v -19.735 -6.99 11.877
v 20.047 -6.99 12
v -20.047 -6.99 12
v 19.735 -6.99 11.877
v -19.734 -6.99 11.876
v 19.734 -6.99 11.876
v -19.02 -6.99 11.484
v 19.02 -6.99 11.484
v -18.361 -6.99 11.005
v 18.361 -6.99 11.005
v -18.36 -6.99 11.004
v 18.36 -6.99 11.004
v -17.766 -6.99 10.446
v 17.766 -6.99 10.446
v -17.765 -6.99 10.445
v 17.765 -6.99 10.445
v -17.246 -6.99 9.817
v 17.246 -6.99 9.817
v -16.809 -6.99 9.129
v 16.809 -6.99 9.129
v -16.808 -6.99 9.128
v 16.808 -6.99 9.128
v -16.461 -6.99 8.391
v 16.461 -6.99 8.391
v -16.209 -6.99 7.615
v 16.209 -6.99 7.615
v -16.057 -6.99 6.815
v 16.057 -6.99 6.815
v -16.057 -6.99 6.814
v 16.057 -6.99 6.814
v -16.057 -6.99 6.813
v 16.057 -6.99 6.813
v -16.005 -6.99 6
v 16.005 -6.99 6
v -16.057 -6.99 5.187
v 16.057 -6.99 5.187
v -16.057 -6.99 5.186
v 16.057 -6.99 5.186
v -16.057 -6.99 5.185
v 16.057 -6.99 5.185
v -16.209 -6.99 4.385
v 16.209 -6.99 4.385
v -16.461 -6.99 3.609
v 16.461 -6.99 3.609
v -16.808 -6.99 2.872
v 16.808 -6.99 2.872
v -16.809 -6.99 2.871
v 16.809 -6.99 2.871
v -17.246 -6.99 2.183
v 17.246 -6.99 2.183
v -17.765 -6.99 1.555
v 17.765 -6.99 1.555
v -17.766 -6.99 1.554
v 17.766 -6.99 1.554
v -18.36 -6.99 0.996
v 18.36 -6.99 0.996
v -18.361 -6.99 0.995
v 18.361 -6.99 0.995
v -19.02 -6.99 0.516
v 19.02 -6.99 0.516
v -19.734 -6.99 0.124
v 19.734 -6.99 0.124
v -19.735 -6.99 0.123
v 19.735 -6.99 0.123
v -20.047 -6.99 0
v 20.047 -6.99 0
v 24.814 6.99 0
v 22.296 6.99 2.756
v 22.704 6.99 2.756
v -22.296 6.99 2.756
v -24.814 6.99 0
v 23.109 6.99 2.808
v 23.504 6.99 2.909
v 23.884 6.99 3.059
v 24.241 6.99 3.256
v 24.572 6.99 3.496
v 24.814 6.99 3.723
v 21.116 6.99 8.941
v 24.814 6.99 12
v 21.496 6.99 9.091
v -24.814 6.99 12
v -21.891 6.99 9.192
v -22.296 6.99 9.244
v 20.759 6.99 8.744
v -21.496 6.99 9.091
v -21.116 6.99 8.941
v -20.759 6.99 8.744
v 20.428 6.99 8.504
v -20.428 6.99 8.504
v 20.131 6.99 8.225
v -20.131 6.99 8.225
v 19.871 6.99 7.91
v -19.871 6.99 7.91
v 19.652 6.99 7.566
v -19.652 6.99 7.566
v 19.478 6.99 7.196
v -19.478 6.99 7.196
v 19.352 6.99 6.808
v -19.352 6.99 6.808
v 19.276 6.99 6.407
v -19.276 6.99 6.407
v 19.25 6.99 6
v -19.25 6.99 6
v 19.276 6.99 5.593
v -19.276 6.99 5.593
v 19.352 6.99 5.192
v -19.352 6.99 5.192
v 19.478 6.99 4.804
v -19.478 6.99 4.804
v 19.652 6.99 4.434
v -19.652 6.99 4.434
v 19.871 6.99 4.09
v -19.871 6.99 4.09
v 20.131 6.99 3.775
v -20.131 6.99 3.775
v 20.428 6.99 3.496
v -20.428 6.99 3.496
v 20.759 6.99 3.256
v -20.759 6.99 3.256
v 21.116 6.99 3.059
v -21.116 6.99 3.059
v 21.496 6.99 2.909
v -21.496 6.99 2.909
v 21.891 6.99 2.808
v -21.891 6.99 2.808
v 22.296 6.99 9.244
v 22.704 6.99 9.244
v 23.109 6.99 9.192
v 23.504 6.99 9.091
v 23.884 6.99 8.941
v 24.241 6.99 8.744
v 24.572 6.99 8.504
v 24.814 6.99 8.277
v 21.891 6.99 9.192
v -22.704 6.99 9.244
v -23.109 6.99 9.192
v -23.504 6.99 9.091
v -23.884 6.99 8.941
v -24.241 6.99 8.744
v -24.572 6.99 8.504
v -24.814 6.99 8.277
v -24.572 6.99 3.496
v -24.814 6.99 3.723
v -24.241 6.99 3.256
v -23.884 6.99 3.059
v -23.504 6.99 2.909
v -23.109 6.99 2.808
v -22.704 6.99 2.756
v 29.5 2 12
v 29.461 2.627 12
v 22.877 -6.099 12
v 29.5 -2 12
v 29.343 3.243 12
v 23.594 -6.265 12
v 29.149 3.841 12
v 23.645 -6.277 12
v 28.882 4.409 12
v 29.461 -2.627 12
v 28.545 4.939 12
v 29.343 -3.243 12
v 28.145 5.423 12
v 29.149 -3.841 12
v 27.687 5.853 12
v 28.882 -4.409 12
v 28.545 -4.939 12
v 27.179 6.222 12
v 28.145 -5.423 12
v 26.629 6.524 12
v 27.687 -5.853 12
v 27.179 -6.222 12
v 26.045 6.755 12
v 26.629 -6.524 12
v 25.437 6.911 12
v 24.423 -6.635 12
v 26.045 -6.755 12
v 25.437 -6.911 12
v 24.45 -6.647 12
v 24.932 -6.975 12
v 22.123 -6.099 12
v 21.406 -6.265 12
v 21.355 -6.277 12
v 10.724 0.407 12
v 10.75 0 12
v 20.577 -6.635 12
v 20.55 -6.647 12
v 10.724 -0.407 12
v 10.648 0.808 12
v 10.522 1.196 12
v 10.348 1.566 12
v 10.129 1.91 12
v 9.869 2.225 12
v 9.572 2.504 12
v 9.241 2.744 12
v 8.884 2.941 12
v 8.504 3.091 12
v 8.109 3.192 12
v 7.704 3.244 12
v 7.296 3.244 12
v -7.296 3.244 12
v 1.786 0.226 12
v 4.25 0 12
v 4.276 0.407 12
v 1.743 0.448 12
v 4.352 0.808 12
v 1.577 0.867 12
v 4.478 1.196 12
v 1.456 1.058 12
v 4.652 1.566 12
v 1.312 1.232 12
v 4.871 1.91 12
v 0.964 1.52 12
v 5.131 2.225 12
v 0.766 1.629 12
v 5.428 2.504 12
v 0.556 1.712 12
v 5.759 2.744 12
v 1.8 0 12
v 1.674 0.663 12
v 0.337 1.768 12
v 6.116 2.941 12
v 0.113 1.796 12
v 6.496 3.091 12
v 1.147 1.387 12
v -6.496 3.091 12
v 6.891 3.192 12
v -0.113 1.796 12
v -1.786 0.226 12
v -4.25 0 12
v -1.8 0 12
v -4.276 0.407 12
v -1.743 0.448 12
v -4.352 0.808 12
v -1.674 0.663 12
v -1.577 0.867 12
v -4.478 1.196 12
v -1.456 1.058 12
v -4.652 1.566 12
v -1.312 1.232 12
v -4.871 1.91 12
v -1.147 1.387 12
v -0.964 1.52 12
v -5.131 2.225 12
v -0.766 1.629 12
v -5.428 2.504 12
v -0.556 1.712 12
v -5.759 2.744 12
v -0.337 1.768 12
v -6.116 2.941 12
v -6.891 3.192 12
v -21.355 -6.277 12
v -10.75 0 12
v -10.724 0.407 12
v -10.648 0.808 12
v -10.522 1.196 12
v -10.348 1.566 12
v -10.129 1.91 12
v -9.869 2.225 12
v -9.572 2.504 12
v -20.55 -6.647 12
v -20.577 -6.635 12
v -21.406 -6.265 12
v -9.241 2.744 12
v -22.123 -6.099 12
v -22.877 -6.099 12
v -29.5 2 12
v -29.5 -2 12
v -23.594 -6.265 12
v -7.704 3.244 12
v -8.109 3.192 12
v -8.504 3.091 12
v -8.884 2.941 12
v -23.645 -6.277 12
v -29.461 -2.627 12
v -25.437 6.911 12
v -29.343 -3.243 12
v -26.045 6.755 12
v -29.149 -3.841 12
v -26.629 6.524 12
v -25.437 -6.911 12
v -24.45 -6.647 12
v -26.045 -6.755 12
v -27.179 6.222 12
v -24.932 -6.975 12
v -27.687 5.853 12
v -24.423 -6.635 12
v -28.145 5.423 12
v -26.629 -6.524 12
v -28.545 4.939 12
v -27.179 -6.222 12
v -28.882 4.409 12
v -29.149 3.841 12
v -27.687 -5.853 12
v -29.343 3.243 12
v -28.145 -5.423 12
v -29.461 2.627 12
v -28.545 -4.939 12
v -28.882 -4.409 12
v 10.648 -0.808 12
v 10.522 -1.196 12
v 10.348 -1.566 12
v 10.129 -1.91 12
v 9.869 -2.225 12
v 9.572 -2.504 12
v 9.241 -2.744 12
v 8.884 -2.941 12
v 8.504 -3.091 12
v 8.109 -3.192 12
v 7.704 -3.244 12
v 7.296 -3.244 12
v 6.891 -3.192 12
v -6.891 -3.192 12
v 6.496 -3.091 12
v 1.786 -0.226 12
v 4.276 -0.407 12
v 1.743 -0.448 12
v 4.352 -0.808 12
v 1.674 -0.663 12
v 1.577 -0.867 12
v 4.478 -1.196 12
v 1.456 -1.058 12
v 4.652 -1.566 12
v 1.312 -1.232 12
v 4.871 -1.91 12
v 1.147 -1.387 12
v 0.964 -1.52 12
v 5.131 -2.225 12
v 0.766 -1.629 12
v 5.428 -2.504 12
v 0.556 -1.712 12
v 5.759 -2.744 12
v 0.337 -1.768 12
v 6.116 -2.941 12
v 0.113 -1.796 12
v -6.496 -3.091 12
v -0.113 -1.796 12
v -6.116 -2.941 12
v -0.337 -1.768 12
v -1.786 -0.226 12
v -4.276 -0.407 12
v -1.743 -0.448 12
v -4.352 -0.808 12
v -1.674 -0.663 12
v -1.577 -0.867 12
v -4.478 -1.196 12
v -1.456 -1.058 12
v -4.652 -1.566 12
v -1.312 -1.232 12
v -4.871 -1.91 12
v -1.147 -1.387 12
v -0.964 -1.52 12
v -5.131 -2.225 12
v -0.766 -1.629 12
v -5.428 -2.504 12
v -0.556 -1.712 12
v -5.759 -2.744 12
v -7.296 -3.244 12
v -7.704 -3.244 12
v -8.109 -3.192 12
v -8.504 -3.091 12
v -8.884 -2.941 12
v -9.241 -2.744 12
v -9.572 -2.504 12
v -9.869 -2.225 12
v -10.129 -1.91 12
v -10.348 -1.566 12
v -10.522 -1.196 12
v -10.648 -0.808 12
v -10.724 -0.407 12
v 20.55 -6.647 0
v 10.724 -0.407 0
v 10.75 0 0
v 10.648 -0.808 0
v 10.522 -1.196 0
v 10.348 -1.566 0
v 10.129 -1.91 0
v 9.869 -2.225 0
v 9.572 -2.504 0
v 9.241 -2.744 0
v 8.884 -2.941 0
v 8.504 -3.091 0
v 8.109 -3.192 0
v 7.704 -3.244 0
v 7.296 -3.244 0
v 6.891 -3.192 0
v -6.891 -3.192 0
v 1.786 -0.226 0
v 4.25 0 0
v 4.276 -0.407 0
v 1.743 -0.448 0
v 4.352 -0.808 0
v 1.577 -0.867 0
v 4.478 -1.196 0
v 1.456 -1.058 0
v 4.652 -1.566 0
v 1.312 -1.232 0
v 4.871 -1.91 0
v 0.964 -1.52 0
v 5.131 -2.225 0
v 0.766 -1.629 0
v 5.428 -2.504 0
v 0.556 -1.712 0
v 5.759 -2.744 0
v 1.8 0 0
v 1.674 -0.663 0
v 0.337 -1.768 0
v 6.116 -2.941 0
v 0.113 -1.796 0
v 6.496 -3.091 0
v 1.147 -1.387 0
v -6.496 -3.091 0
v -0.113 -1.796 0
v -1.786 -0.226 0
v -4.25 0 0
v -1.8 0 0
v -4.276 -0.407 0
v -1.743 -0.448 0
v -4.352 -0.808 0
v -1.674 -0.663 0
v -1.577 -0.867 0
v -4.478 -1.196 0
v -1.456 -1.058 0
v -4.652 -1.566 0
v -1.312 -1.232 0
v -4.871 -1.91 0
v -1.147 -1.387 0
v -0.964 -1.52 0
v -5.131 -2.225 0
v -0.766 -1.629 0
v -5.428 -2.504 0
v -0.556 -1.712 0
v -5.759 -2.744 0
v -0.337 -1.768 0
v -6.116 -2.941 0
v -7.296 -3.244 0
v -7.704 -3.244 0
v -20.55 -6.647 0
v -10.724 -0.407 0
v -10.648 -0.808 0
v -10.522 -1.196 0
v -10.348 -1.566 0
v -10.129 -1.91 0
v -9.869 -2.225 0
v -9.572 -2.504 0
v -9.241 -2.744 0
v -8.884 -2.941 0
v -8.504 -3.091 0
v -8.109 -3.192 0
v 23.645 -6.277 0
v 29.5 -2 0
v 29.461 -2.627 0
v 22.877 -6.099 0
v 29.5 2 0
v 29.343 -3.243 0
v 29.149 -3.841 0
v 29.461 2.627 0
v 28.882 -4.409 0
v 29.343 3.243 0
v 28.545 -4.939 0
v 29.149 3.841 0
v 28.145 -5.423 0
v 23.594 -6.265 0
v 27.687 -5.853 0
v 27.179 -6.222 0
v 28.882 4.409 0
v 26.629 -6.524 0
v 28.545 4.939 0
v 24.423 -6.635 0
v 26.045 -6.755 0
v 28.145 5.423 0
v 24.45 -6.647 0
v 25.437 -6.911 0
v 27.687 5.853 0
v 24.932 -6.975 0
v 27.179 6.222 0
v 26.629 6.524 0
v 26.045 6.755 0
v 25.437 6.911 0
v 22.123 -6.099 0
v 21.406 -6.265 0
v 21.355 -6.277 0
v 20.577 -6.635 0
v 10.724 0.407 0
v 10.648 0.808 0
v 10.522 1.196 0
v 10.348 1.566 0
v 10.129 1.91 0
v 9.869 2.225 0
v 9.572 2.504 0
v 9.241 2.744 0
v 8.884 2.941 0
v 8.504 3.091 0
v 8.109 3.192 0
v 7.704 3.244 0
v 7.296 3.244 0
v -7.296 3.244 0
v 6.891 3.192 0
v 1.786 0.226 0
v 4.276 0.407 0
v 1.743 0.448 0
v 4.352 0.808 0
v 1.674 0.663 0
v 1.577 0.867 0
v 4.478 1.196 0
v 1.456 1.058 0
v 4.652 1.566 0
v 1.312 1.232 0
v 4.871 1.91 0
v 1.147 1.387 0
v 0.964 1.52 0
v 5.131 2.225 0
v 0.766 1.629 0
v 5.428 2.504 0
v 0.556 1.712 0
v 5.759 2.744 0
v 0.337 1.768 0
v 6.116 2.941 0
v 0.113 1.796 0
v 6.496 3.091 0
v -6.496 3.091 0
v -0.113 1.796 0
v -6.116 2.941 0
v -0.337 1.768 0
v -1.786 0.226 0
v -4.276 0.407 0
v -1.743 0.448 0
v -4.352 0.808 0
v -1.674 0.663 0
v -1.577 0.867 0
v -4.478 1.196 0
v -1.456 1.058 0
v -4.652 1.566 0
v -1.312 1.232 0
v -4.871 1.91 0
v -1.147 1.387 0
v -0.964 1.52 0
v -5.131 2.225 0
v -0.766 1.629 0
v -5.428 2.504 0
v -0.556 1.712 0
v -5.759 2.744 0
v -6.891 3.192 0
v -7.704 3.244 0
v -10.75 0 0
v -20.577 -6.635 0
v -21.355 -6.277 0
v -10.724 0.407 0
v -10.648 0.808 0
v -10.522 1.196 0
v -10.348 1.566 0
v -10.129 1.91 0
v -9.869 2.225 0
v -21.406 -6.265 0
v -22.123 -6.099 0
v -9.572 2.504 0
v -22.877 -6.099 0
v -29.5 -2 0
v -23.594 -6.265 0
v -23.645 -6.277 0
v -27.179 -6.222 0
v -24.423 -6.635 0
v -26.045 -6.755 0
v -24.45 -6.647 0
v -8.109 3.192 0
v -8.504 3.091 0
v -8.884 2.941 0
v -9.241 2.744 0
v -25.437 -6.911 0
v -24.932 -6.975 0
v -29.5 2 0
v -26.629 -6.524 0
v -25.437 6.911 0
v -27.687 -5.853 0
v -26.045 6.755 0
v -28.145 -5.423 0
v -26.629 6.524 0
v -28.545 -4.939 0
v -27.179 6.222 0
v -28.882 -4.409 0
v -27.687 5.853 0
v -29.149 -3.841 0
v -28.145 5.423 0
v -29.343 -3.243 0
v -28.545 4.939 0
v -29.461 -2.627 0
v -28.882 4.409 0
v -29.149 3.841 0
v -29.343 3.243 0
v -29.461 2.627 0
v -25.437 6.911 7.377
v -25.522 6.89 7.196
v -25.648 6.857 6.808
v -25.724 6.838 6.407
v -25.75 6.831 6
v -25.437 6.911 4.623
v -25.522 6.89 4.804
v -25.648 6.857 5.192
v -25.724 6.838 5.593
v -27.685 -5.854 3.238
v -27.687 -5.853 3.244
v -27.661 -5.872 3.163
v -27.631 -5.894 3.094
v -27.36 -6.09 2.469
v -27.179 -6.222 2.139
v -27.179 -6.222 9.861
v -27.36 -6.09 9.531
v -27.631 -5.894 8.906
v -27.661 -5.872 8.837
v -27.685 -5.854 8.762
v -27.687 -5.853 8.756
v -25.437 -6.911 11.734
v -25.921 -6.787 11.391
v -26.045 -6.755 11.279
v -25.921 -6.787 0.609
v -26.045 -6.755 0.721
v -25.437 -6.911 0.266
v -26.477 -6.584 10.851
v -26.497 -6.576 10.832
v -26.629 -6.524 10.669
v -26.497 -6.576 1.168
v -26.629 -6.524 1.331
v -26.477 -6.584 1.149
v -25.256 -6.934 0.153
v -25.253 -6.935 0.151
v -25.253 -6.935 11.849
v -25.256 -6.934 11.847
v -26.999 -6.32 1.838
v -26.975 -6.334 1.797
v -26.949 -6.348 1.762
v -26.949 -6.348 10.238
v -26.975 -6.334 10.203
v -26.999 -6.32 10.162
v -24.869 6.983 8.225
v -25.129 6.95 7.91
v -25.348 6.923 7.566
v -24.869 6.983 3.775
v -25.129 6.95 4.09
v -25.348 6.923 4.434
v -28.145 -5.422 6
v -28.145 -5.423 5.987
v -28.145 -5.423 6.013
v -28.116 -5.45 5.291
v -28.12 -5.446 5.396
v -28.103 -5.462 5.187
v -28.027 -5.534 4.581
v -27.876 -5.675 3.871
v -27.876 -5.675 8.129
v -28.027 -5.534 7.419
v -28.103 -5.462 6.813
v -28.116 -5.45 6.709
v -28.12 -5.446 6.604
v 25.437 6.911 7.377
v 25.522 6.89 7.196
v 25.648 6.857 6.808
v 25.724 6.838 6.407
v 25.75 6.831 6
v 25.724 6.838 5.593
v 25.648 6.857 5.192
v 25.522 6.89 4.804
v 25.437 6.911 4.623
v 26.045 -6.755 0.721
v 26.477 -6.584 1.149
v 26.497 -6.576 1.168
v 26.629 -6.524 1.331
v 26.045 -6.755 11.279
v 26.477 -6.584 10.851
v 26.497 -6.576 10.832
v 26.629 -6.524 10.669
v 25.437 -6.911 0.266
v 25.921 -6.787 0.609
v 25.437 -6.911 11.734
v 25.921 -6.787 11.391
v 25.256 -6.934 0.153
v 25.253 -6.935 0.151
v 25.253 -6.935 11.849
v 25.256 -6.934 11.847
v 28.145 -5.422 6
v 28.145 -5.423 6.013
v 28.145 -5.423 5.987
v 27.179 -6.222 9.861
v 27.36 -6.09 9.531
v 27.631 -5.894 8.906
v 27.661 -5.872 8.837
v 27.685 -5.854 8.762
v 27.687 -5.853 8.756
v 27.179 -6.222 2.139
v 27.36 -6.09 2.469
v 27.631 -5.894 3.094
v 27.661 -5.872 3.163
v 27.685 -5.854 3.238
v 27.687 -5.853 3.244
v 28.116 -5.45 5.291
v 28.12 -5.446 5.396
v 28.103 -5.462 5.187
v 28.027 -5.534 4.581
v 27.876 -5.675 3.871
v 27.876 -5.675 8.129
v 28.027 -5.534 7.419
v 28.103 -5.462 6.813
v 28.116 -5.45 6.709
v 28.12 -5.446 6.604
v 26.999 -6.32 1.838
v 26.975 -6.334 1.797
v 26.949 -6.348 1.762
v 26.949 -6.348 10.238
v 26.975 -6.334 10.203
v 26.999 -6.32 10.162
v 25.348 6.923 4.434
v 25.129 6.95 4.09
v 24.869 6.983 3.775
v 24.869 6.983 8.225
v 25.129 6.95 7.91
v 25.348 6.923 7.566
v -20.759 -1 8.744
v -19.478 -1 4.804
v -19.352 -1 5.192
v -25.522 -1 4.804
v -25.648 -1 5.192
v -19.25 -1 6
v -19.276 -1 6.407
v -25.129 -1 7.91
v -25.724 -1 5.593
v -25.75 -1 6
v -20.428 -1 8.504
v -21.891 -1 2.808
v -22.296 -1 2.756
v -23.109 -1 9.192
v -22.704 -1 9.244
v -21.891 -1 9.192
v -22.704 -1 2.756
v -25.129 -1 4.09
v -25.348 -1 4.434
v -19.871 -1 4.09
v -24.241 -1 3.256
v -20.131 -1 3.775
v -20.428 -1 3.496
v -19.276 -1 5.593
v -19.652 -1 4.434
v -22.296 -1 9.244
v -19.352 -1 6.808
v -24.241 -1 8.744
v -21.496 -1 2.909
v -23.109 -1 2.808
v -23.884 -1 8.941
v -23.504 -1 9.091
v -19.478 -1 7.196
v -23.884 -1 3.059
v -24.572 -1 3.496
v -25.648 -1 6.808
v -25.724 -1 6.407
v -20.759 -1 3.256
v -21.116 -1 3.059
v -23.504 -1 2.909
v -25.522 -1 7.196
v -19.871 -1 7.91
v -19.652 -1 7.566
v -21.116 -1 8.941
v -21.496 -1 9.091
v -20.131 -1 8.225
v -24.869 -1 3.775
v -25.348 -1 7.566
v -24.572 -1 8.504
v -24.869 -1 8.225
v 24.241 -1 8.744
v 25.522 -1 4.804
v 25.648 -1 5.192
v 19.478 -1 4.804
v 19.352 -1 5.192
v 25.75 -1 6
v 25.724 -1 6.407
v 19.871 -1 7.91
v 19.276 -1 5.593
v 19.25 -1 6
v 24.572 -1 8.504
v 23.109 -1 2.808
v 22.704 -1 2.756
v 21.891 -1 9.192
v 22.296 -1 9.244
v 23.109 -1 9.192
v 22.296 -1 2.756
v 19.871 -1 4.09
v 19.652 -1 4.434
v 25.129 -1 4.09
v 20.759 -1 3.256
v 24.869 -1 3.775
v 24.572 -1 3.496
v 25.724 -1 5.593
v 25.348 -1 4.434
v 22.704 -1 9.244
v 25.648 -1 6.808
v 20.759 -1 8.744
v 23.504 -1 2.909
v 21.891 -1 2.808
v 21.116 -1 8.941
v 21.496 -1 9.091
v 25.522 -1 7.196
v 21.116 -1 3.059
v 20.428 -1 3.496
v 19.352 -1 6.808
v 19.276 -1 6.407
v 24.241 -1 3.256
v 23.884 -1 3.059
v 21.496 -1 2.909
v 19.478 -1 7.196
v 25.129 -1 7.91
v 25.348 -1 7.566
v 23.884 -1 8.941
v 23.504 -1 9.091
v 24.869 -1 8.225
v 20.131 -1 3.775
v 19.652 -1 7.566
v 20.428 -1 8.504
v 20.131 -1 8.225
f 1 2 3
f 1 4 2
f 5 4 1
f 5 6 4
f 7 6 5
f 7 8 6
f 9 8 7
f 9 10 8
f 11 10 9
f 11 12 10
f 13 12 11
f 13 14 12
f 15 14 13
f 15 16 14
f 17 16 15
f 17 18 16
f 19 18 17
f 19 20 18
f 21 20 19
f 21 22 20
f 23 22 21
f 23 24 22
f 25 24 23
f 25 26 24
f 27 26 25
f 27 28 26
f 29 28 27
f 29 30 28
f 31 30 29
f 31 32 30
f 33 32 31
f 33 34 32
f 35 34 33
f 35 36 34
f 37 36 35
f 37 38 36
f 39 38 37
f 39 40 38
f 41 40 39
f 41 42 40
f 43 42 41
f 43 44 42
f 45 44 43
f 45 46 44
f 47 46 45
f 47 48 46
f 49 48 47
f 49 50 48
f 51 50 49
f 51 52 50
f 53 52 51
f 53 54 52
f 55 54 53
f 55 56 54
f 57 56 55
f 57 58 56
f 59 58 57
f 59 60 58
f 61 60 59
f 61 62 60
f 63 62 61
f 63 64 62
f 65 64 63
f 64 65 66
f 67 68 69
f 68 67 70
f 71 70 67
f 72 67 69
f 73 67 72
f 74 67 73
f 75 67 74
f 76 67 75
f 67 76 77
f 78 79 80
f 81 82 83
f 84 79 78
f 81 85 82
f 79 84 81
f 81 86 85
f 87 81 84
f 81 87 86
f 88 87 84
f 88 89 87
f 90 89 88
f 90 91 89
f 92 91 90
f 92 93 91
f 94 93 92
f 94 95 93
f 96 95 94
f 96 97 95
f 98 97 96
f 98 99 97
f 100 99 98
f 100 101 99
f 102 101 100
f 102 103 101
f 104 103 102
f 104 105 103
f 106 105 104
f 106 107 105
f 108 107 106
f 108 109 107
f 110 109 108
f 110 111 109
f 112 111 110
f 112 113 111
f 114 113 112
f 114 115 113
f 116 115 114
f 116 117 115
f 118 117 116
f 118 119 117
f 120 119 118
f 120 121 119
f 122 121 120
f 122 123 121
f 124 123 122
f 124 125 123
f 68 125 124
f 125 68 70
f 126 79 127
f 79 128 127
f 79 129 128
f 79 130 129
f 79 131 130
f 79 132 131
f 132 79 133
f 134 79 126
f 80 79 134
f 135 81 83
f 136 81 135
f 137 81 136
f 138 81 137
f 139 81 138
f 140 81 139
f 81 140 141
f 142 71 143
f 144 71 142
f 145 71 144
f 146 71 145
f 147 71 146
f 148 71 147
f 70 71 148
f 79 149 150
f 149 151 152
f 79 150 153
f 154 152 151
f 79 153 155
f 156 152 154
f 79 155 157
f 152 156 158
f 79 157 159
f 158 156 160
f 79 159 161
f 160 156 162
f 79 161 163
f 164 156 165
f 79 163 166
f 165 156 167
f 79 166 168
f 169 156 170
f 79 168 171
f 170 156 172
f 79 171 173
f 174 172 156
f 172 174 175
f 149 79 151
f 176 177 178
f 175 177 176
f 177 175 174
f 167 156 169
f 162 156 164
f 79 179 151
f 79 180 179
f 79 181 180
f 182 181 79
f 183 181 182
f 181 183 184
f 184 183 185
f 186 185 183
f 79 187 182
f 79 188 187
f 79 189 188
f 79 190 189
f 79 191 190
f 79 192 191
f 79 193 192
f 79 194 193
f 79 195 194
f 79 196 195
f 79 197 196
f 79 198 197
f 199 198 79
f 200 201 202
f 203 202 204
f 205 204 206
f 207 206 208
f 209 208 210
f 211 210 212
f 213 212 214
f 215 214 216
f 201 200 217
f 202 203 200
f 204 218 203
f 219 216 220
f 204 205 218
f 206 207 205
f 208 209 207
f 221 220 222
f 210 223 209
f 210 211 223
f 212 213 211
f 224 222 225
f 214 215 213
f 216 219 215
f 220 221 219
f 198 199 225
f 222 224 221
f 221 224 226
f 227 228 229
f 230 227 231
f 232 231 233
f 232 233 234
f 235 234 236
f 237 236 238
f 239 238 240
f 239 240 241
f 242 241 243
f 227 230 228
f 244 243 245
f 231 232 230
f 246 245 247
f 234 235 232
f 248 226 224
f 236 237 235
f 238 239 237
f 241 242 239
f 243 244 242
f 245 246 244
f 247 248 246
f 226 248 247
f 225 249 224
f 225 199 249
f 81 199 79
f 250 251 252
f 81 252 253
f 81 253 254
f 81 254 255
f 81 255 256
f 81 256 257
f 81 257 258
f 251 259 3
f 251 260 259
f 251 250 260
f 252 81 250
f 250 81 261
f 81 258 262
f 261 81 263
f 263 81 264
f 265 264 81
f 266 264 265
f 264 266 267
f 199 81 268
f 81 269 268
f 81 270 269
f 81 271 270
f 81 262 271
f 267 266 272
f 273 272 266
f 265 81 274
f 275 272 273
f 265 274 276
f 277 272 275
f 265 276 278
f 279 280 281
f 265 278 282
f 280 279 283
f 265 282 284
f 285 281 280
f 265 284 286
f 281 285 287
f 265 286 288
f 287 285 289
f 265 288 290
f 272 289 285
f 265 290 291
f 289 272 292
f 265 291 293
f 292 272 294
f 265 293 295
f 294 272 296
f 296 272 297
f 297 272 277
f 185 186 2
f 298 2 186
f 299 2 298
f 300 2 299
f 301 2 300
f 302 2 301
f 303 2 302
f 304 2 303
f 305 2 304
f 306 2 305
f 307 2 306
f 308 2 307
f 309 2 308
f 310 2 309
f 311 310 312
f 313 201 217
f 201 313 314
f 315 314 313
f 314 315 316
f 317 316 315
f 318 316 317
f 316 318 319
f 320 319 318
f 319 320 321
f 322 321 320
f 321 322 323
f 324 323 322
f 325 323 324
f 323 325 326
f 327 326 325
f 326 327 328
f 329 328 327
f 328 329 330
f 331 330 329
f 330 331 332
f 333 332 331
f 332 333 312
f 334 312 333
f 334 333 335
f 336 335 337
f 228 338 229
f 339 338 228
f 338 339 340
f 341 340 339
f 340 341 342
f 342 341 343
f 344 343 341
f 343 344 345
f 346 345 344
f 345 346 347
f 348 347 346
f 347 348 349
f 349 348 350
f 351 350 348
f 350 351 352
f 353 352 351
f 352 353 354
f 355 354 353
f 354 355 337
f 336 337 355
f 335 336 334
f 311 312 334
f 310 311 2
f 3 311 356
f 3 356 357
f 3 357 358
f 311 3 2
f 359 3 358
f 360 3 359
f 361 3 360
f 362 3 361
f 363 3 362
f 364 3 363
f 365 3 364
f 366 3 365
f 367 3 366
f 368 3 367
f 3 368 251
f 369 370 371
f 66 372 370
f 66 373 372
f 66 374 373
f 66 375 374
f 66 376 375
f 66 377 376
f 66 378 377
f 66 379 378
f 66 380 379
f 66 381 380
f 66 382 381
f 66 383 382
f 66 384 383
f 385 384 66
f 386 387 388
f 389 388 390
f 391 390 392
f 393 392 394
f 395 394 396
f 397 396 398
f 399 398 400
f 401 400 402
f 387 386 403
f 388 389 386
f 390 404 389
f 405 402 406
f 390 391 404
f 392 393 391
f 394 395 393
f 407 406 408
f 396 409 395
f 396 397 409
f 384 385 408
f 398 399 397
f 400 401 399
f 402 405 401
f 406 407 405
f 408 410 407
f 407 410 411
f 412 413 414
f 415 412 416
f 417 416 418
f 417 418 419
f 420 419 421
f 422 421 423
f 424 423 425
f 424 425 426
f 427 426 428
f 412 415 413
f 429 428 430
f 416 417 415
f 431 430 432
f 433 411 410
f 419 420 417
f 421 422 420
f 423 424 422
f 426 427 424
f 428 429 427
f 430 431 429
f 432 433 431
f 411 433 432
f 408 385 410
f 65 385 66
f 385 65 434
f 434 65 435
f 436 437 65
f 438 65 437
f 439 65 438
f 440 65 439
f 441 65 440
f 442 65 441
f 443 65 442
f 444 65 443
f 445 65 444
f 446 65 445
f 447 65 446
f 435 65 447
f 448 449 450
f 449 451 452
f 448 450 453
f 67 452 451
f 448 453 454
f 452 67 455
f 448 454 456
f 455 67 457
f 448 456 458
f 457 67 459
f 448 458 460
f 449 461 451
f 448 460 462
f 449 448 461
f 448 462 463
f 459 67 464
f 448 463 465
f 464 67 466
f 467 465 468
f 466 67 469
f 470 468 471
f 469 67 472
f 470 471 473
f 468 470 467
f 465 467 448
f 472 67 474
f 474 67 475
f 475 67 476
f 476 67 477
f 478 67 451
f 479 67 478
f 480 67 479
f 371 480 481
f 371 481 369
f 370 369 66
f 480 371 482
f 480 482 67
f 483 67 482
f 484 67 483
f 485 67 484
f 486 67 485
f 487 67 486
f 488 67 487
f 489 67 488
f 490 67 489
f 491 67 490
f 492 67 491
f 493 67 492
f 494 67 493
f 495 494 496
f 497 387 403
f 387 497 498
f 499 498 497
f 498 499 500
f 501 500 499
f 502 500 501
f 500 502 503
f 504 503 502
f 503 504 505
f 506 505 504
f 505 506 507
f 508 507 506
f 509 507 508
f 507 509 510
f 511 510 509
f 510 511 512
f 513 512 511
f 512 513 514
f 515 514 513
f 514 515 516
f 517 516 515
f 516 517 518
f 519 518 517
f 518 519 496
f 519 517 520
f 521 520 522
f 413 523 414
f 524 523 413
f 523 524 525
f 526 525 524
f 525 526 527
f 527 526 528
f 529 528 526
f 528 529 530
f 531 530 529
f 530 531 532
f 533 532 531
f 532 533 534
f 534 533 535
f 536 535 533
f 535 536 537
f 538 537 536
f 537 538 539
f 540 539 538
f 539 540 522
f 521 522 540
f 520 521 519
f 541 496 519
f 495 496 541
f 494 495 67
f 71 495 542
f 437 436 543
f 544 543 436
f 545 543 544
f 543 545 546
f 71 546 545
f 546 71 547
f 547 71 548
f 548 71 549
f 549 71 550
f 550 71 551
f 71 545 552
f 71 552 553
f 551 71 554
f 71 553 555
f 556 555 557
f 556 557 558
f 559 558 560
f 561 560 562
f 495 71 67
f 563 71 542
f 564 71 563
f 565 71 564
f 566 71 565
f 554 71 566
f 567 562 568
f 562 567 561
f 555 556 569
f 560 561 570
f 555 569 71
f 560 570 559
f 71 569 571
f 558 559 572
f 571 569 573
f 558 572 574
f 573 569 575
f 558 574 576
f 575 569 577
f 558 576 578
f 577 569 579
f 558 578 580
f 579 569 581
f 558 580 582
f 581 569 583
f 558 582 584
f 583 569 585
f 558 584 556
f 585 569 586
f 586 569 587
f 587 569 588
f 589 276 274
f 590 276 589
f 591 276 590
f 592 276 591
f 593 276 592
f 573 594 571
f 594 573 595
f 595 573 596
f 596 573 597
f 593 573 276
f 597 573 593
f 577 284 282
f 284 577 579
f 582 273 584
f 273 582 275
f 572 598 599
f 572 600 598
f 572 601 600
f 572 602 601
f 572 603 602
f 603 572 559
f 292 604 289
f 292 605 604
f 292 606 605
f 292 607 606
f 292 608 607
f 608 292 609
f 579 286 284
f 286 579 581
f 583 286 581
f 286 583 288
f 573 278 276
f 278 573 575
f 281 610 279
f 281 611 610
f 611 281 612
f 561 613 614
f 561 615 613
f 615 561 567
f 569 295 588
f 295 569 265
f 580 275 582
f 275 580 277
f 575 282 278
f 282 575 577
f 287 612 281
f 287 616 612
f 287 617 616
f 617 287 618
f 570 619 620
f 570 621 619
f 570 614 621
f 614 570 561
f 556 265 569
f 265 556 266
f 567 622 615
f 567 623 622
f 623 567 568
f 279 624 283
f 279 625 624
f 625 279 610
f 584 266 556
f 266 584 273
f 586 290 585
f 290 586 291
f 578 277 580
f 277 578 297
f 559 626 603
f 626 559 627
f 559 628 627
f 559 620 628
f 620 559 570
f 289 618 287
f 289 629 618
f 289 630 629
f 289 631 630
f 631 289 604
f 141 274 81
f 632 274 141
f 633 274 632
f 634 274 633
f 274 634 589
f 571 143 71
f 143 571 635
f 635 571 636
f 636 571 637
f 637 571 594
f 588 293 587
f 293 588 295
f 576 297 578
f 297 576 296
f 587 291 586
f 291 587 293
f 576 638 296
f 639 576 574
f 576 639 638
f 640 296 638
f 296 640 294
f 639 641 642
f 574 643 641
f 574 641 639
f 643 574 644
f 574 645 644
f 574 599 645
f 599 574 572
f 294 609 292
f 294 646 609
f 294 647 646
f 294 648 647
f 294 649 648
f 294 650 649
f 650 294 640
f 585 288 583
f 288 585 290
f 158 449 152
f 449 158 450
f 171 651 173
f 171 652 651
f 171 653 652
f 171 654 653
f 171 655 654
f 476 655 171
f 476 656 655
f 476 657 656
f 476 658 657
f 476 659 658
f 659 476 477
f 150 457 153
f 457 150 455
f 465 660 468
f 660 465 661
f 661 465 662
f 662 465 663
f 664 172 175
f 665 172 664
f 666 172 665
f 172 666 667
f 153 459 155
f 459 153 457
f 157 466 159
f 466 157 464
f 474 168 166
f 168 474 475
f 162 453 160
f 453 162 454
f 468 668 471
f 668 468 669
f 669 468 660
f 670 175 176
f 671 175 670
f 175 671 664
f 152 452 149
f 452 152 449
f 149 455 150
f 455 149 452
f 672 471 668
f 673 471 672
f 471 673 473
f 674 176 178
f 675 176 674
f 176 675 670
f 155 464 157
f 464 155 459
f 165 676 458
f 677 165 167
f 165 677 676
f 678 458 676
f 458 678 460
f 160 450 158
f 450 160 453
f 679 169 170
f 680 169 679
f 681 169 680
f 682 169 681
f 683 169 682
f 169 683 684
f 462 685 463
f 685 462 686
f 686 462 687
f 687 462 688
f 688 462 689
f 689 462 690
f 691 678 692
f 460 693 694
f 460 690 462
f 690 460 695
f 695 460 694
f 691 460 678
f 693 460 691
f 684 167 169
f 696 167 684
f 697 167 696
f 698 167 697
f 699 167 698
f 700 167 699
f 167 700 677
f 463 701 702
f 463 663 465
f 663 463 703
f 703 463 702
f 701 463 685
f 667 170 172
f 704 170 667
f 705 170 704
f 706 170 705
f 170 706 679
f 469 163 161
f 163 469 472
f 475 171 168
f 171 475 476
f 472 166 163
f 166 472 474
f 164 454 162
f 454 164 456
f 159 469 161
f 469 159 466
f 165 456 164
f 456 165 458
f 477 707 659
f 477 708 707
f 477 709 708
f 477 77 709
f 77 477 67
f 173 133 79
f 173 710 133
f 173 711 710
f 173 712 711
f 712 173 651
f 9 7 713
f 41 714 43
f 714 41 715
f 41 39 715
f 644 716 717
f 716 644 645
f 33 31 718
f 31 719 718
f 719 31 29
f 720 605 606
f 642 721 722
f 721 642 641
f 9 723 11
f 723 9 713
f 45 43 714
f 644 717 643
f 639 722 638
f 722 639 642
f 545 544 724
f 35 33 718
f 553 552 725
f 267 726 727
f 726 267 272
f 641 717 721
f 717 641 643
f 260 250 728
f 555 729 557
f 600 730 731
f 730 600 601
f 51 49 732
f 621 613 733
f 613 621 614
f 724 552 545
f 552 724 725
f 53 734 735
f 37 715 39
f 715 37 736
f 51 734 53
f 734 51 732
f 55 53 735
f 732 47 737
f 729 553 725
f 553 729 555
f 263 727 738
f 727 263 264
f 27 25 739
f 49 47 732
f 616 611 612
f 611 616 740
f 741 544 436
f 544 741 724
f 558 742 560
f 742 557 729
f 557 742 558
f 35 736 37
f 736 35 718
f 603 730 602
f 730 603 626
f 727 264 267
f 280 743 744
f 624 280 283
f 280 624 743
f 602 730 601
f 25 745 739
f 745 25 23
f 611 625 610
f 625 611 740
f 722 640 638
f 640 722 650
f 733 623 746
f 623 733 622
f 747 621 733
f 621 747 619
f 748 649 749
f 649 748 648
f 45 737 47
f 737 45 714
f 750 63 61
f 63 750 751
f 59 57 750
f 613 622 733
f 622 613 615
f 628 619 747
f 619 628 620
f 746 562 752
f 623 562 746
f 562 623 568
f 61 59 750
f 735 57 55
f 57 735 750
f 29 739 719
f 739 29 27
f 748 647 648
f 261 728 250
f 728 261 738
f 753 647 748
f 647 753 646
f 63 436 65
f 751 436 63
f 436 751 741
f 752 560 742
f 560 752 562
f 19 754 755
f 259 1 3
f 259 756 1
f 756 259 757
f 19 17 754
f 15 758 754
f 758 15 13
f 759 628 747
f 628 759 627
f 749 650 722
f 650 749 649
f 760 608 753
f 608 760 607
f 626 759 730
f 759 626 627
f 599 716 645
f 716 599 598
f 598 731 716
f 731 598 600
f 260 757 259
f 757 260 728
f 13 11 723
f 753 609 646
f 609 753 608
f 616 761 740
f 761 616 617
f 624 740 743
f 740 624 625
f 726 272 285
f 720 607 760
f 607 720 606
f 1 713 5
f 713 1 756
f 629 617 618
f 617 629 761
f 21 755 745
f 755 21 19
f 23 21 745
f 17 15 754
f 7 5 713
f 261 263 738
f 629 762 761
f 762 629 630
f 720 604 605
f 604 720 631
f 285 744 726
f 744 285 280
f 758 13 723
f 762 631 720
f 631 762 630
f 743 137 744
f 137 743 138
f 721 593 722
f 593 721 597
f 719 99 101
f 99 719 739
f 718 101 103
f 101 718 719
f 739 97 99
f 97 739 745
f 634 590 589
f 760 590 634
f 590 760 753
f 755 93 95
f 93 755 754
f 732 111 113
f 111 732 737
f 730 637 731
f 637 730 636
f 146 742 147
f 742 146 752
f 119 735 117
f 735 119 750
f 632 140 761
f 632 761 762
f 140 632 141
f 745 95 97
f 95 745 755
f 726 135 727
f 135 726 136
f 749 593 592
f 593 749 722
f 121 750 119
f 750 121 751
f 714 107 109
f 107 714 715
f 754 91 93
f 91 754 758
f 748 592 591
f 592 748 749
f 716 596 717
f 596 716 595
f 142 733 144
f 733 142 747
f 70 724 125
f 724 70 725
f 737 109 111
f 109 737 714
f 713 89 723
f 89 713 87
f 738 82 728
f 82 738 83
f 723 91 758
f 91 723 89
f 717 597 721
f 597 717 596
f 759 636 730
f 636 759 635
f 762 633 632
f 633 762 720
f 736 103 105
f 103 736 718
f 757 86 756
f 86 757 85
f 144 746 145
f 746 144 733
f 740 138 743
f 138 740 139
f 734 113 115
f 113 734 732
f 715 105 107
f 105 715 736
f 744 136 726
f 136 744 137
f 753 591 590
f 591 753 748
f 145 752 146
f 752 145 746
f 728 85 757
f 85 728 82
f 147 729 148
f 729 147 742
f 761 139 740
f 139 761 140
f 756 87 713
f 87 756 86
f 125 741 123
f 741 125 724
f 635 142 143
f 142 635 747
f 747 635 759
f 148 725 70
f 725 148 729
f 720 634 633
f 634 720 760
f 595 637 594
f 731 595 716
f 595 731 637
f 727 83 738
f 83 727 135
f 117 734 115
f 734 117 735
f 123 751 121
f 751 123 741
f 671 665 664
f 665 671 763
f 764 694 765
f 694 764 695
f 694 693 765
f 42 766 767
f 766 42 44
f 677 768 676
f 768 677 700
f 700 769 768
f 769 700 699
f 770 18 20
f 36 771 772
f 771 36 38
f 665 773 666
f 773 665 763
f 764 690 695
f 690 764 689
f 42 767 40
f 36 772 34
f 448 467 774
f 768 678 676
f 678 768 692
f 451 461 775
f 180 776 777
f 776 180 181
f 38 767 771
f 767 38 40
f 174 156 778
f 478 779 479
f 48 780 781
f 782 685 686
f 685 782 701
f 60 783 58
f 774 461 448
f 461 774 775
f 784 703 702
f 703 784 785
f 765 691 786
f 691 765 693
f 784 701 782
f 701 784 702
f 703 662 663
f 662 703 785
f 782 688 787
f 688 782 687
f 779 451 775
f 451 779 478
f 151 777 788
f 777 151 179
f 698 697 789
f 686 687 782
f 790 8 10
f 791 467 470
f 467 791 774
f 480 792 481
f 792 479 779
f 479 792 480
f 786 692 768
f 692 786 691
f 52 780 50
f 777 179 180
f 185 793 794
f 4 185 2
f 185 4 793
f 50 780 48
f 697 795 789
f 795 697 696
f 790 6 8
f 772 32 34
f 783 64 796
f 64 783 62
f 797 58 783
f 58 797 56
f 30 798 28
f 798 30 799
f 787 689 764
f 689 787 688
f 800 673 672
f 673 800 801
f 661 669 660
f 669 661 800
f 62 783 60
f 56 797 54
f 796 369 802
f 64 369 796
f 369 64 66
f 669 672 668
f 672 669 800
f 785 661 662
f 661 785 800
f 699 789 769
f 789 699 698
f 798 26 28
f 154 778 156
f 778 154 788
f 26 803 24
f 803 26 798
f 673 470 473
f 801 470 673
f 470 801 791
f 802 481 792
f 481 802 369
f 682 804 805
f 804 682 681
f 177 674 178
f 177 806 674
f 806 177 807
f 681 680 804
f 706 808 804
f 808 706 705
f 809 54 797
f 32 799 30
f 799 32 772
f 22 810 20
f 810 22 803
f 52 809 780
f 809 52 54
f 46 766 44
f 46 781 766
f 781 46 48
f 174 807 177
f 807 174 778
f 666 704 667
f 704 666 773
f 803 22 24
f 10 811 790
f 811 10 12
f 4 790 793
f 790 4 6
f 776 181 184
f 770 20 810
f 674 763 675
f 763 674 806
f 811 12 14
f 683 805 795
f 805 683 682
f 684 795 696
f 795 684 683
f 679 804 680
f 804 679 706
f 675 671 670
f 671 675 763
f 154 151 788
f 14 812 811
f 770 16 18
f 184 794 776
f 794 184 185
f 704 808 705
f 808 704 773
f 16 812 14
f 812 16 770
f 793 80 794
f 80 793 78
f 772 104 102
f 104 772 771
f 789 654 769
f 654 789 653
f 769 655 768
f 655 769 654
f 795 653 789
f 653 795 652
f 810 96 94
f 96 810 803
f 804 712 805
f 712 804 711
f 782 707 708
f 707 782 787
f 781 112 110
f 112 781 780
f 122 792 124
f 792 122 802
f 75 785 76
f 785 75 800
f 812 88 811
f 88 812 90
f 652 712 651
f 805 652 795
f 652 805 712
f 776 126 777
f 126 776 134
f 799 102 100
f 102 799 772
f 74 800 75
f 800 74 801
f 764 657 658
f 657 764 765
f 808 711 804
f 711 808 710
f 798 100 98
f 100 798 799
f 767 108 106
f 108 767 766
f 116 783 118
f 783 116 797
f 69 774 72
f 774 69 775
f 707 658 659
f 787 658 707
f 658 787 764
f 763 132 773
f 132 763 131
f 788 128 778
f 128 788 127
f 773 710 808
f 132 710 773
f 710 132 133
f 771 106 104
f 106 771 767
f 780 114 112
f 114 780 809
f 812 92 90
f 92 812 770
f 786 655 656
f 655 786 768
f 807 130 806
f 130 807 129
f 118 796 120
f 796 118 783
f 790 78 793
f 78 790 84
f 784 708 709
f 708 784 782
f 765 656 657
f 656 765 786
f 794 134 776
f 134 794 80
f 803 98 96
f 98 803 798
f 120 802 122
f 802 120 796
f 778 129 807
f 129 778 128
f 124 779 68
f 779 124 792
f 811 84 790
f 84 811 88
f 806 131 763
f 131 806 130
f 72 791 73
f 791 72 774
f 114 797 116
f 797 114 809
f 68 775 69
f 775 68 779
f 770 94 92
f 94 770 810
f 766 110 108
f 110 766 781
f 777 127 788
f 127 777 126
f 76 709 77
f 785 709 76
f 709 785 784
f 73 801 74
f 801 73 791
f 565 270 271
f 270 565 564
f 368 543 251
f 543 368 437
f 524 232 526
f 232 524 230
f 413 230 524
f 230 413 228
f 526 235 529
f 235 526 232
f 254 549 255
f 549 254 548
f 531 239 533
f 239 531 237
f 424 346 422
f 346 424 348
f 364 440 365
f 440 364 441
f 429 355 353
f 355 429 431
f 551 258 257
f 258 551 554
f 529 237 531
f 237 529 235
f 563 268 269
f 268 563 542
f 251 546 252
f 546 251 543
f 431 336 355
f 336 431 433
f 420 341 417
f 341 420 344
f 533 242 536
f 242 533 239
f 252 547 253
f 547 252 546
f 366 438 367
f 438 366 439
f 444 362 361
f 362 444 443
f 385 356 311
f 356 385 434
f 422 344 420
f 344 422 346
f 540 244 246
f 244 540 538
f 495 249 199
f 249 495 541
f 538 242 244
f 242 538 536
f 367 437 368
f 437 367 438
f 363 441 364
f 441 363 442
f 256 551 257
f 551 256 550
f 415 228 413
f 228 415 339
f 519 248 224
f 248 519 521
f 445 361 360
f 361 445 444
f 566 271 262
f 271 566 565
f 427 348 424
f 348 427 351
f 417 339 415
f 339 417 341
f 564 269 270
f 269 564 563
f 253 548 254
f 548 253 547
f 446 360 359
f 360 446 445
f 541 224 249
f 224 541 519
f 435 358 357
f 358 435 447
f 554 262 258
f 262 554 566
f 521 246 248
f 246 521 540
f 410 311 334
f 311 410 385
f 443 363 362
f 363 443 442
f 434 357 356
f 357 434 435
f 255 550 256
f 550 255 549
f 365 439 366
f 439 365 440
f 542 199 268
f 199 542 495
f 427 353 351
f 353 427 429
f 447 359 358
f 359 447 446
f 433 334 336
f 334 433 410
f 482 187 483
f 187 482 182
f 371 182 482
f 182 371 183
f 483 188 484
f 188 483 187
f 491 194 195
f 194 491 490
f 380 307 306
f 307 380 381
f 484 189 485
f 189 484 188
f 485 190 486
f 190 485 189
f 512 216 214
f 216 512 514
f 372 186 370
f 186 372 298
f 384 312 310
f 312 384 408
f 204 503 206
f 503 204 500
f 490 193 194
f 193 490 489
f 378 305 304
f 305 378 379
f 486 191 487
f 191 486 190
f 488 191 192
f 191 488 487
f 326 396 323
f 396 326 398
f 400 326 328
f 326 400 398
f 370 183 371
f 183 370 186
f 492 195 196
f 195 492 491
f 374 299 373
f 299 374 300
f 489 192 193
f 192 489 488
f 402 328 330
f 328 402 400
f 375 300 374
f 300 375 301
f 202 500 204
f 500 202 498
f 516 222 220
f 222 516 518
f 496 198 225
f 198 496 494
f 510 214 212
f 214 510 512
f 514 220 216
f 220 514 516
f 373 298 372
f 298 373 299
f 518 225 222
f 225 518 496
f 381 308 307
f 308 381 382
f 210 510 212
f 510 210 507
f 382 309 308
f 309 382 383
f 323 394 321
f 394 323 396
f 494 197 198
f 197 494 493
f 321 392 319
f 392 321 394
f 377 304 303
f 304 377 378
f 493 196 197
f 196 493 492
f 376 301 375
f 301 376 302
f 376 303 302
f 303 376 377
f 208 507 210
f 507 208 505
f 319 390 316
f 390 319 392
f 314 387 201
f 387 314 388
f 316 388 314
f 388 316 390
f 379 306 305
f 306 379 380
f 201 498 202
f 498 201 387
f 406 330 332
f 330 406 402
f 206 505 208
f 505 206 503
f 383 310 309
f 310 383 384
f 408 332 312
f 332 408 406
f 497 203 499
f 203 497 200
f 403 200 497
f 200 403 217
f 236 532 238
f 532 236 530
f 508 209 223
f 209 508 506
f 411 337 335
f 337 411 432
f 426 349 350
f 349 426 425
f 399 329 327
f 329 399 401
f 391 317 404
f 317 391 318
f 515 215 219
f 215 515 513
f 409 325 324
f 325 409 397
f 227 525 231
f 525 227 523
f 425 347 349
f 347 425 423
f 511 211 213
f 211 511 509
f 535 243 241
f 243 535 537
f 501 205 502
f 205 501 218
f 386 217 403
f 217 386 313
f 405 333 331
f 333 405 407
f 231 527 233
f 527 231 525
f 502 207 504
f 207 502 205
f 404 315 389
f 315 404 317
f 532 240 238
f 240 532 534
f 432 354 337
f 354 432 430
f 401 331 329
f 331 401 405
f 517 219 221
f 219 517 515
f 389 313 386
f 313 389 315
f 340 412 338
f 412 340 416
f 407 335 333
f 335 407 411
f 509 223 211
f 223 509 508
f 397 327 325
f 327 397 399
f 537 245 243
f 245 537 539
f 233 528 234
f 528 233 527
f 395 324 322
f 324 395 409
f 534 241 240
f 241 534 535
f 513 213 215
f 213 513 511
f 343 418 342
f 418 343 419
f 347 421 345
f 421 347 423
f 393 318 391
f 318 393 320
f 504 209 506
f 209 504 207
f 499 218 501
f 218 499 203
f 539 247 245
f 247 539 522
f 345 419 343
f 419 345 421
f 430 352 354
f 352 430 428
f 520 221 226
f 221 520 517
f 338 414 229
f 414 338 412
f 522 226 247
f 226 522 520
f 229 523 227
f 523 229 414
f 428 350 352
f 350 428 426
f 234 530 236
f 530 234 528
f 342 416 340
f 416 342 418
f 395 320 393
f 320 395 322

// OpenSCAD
$fn = 50;


difference() {
	union() {
		hull() {
			translate(v = [-9.5000000000, 2.0000000000, 0]) {
				cylinder(h = 12, r = 5);
			}
			translate(v = [9.5000000000, 2.0000000000, 0]) {
				cylinder(h = 12, r = 5);
			}
			translate(v = [-9.5000000000, -2.0000000000, 0]) {
				cylinder(h = 12, r = 5);
			}
			translate(v = [9.5000000000, -2.0000000000, 0]) {
				cylinder(h = 12, r = 5);
			}
		}
		translate(v = [-15.0000000000, 0.0000000000, 0]) {
			hull() {
				translate(v = [-9.5000000000, 2.0000000000, 0]) {
					cylinder(h = 12, r = 5);
				}
				translate(v = [9.5000000000, 2.0000000000, 0]) {
					cylinder(h = 12, r = 5);
				}
				translate(v = [-9.5000000000, -2.0000000000, 0]) {
					cylinder(h = 12, r = 5);
				}
				translate(v = [9.5000000000, -2.0000000000, 0]) {
					cylinder(h = 12, r = 5);
				}
			}
		}
		translate(v = [-15.0000000000, 0.0000000000, 0]) {
			hull() {
				translate(v = [-9.5000000000, 2.0000000000, 0]) {
					cylinder(h = 12, r = 5);
				}
				translate(v = [9.5000000000, 2.0000000000, 0]) {
					cylinder(h = 12, r = 5);
				}
				translate(v = [-9.5000000000, -2.0000000000, 0]) {
					cylinder(h = 12, r = 5);
				}
				translate(v = [9.5000000000, -2.0000000000, 0]) {
					cylinder(h = 12, r = 5);
				}
			}
		}
		translate(v = [15.0000000000, 0.0000000000, 0]) {
			hull() {
				translate(v = [-9.5000000000, 2.0000000000, 0]) {
					cylinder(h = 12, r = 5);
				}
				translate(v = [9.5000000000, 2.0000000000, 0]) {
					cylinder(h = 12, r = 5);
				}
				translate(v = [-9.5000000000, -2.0000000000, 0]) {
					cylinder(h = 12, r = 5);
				}
				translate(v = [9.5000000000, -2.0000000000, 0]) {
					cylinder(h = 12, r = 5);
				}
			}
		}
		translate(v = [15.0000000000, 0.0000000000, 0]) {
			hull() {
				translate(v = [-9.5000000000, 2.0000000000, 0]) {
					cylinder(h = 12, r = 5);
				}
				translate(v = [9.5000000000, 2.0000000000, 0]) {
					cylinder(h = 12, r = 5);
				}
				translate(v = [-9.5000000000, -2.0000000000, 0]) {
					cylinder(h = 12, r = 5);
				}
				translate(v = [9.5000000000, -2.0000000000, 0]) {
					cylinder(h = 12, r = 5);
				}
			}
		}
	}
	union() {
		translate(v = [-22.5000000000, -7.0000000000, 6.0000000000]) {
			rotate(a = [90, 0, 0]) {
				difference() {
					union() {
						#translate(v = [0, 0, -14.0000000000]) {
							cylinder(h = 14, r = 2.2500000000);
						}
						#translate(v = [0, 0, -6]) {
							cylinder(h = 6, r1 = 3.2500000000, r2 = 6.5000000000);
						}
						#translate(v = [0, 0, -14.0000000000]) {
							cylinder(h = 14, r = 3.2500000000);
						}
						#translate(v = [0, 0, -14.0000000000]) {
							cylinder(h = 14, r = 2.2500000000);
						}
					}
					union();
				}
			}
		}
		translate(v = [22.5000000000, -7.0000000000, 6.0000000000]) {
			rotate(a = [90, 0, 0]) {
				difference() {
					union() {
						#translate(v = [0, 0, -14.0000000000]) {
							cylinder(h = 14, r = 2.2500000000);
						}
						#translate(v = [0, 0, -6]) {
							cylinder(h = 6, r1 = 3.2500000000, r2 = 6.5000000000);
						}
						#translate(v = [0, 0, -14.0000000000]) {
							cylinder(h = 14, r = 3.2500000000);
						}
						#translate(v = [0, 0, -14.0000000000]) {
							cylinder(h = 14, r = 2.2500000000);
						}
					}
					union();
				}
			}
		}
		translate(v = [-7.5000000000, 0.0000000000, 0]) {
			translate(v = [0, 0, -100]) {
				cylinder(h = 200, r = 3.2500000000);
			}
		}
		translate(v = [7.5000000000, 0.0000000000, 0]) {
			translate(v = [0, 0, -100]) {
				cylinder(h = 200, r = 3.2500000000);
			}
		}
		translate(v = [-7.5000000000, 0.0000000000, 0]) {
			translate(v = [0, 0, -100]) {
				cylinder(h = 200, r = 1.8000000000);
			}
		}
		translate(v = [0, 0, -100]) {
			cylinder(h = 200, r = 1.8000000000);
		}
		translate(v = [7.5000000000, 0.0000000000, 0]) {
			translate(v = [0, 0, -100]) {
				cylinder(h = 200, r = 1.8000000000);
			}
		}
	}
}
